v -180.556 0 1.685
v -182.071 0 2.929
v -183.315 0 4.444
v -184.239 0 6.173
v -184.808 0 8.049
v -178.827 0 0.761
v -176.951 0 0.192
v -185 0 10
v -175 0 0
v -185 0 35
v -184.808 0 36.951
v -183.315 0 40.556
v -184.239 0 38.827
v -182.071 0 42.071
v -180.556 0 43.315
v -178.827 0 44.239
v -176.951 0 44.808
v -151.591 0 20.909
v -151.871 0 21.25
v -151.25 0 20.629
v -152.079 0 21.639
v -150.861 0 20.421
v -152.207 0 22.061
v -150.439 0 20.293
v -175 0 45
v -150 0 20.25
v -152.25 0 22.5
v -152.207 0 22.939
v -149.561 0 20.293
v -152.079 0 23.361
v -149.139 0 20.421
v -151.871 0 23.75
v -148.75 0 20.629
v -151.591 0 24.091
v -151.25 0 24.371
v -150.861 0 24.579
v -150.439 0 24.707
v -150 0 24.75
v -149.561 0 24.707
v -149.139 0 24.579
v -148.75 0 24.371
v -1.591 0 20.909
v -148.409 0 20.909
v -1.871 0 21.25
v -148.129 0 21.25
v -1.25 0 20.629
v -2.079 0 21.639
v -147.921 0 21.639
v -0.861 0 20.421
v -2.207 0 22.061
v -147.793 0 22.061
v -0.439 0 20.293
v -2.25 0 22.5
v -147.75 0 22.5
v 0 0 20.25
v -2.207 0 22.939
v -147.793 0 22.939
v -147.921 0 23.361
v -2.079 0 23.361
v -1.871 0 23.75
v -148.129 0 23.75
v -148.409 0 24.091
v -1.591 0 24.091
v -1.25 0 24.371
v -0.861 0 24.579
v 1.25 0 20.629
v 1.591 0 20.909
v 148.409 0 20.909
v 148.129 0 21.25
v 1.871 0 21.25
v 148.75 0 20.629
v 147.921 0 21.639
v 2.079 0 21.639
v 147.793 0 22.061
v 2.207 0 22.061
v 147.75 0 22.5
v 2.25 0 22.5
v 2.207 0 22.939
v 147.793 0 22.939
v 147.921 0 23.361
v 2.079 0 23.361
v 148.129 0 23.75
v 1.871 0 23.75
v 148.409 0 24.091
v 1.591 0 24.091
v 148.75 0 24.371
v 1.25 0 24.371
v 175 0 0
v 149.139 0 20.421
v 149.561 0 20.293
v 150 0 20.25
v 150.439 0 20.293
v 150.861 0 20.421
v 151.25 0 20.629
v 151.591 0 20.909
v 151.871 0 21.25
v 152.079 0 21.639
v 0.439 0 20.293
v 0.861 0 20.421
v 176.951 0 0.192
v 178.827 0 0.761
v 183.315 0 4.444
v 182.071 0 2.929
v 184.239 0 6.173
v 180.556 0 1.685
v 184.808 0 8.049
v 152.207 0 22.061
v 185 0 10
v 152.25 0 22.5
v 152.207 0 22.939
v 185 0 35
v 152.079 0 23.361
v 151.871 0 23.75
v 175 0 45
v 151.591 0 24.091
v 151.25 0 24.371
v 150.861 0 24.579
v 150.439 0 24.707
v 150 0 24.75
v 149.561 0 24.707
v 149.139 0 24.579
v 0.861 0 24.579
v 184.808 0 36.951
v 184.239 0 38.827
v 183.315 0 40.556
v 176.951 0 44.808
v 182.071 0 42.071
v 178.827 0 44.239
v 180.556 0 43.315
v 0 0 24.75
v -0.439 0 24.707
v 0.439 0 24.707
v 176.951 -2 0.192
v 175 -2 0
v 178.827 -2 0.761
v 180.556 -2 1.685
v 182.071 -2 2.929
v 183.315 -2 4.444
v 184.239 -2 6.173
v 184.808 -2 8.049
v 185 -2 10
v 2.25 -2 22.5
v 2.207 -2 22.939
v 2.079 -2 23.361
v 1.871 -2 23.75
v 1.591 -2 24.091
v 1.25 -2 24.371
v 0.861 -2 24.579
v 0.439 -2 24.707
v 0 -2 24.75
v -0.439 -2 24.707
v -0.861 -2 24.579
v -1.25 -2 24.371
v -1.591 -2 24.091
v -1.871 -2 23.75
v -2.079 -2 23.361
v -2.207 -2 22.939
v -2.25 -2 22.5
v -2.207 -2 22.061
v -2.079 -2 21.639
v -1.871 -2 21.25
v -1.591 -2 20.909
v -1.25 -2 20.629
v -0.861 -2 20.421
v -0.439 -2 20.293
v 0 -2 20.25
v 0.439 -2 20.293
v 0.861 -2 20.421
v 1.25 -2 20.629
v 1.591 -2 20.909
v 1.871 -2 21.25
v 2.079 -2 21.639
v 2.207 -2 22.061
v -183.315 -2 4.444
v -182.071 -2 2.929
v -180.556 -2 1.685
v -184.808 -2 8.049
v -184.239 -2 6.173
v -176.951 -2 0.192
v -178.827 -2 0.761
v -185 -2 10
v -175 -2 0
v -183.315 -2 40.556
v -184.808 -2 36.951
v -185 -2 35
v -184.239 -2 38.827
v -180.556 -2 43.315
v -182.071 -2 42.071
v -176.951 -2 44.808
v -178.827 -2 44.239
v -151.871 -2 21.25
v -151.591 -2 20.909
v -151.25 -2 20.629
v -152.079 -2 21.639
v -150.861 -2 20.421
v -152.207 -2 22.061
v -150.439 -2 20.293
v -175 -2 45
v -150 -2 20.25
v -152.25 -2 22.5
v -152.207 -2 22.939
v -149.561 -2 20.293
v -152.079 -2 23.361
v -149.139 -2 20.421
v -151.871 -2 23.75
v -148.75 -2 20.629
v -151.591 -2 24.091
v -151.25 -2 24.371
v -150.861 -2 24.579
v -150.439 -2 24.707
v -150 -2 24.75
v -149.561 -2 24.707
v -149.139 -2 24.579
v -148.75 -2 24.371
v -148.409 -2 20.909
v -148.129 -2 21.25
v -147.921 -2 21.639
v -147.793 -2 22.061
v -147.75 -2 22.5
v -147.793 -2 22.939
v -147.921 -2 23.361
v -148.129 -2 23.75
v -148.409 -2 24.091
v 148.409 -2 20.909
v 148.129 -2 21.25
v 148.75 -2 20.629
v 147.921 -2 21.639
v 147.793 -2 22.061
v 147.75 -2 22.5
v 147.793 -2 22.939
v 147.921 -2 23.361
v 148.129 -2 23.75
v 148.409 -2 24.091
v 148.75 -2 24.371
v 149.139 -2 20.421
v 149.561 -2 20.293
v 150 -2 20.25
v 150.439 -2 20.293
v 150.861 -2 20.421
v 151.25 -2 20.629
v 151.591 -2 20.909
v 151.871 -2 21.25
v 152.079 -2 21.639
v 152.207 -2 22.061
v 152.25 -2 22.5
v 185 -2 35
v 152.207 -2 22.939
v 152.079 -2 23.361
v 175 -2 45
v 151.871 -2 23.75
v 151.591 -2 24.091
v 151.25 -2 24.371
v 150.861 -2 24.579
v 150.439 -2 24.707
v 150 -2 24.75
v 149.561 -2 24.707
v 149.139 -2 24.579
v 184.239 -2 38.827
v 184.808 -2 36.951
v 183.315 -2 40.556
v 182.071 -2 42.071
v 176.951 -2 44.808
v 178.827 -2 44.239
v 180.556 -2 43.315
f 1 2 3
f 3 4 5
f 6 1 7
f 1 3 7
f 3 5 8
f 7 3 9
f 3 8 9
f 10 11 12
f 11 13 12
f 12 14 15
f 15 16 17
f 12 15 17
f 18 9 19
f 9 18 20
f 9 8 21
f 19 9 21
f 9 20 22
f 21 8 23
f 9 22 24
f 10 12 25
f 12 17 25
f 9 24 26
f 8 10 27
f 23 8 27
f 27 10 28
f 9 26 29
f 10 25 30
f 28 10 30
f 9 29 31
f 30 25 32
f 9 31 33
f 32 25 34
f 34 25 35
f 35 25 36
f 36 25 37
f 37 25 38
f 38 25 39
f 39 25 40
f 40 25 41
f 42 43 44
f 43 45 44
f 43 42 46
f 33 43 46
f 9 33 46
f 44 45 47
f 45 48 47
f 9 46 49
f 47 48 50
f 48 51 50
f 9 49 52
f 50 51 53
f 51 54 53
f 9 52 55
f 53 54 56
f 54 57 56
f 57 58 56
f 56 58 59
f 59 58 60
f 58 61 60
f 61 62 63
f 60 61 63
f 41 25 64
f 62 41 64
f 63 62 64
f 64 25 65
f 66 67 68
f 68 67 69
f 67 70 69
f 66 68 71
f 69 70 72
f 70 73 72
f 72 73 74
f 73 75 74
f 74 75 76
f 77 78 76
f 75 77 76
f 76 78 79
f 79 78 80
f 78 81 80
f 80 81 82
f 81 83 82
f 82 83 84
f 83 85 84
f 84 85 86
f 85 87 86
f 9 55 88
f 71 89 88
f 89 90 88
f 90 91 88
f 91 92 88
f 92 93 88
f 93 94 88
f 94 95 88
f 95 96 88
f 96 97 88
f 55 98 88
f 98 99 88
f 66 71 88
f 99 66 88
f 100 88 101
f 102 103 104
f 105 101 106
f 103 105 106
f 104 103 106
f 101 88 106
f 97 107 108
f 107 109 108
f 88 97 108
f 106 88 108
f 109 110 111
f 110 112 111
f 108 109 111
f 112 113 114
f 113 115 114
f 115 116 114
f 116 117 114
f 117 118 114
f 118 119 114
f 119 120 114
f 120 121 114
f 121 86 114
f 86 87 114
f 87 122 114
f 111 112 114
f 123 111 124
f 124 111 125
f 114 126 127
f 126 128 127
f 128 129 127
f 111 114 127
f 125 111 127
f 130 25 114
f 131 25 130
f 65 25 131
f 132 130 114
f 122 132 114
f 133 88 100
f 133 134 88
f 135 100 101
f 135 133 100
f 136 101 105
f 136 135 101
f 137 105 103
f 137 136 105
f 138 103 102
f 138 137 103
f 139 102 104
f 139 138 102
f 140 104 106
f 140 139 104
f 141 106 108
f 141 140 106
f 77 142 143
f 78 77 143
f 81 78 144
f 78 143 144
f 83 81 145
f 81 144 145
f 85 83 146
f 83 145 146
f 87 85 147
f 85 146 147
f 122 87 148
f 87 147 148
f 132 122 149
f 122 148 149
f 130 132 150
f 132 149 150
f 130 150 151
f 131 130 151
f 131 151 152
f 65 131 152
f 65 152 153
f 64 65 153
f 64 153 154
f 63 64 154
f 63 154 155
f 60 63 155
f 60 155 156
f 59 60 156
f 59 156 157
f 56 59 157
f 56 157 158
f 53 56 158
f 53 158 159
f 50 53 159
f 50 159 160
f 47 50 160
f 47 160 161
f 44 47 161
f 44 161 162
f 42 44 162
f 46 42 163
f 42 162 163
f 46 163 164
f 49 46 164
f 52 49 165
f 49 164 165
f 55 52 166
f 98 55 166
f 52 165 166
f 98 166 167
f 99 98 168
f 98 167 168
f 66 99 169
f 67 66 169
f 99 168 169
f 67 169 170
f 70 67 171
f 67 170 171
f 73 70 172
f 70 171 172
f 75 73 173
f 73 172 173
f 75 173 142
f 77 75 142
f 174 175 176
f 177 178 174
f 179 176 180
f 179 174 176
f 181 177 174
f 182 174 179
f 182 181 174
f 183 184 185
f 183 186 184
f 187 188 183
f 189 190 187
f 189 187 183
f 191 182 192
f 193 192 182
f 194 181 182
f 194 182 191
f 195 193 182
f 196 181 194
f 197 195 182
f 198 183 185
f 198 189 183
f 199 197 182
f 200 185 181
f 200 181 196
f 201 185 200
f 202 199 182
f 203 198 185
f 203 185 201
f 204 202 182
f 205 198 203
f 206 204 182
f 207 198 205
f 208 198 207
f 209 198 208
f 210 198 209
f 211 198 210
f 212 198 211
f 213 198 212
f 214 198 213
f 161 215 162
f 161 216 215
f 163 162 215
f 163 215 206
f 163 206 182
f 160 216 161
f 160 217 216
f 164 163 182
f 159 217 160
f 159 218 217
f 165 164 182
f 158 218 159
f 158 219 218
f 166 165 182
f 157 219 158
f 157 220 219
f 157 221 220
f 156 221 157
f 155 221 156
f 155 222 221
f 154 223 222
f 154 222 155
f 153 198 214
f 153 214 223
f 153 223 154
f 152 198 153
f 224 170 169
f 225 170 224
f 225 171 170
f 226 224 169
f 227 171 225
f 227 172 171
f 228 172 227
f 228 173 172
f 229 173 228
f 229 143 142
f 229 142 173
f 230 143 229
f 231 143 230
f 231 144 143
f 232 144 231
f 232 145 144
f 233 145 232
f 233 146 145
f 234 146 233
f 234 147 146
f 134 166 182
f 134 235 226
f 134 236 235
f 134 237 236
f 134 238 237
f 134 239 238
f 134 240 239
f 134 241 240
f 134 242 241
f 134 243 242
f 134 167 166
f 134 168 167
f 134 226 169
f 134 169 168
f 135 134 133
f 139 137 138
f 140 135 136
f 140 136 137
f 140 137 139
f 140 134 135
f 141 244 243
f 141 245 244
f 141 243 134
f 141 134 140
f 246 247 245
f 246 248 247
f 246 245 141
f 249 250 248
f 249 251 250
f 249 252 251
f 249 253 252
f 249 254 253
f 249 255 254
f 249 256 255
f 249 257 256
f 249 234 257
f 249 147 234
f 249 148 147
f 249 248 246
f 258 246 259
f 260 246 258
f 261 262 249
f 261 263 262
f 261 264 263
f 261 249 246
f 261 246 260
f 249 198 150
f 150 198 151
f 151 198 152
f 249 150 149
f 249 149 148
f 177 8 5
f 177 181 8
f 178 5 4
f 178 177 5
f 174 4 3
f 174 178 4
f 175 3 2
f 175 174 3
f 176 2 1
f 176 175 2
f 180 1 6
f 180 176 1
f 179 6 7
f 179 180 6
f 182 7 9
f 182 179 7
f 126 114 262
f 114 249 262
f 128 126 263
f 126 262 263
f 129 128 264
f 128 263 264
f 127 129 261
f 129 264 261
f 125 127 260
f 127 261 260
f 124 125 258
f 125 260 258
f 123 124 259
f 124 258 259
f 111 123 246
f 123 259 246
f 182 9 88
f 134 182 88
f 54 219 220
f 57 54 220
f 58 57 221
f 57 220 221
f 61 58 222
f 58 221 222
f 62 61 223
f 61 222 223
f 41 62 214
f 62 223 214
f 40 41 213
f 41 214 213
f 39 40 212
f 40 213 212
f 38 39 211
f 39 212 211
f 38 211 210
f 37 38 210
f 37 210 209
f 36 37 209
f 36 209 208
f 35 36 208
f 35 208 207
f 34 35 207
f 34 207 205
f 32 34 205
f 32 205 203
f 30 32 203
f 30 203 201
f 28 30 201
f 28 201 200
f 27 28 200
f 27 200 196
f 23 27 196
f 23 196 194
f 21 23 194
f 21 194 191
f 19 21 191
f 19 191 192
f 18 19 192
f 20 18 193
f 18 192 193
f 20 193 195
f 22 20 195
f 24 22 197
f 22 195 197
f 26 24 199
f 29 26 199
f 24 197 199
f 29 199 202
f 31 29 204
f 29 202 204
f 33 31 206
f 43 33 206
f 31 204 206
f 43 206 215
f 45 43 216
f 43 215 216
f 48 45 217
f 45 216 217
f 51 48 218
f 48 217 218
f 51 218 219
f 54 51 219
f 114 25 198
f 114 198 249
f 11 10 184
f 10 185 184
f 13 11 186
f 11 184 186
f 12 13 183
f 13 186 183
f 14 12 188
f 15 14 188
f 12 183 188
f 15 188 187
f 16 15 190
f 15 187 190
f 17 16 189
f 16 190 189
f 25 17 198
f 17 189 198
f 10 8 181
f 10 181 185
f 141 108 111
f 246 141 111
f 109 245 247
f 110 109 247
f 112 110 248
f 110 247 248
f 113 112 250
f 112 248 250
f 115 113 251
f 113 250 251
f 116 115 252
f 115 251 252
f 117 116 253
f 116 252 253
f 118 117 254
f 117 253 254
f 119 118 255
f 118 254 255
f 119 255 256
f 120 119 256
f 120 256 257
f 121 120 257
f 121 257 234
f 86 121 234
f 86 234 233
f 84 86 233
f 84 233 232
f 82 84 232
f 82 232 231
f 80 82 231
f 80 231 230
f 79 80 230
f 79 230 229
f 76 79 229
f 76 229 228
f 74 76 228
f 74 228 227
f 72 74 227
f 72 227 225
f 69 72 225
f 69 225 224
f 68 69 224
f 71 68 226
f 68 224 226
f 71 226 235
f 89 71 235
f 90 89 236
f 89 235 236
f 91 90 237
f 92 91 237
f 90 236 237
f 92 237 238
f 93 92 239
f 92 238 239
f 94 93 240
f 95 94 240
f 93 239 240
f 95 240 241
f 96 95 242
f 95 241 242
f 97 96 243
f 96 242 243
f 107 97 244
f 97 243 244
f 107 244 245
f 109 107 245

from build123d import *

# Parameters (mm, degrees)
F0_W     = 370
F0_H     = 45
F1_DEPTH = 2
F2_R     = 2.25
F3_DEPTH = 25
F4_R     = 10


with BuildPart() as f1:
    # F0 (on Front) → F1 (new body)
    with BuildSketch(Plane.XZ):
        with Locations((0, 22.5)):
            Rectangle(F0_W, F0_H)
    extrude(amount=F1_DEPTH)

    # F2 (on face) → F3 (cut)
    with BuildSketch(Plane.XZ.offset(2)):
        with Locations((0, 22.5)):
            Circle(F2_R)
        with Locations((-150, 22.5)):
            Circle(F2_R)
        with Locations((150, 22.5)):
            Circle(F2_R)
    extrude(amount=-F3_DEPTH, mode=Mode.SUBTRACT)

    # F4
    f4_edges = [f1.edges().sort_by_distance(p)[0] for p in [
        (185, -1, 45),
        (185, -1, 0),
        (-185, -1, 45),
        (-185, -1, 0),
    ]]
    fillet(f4_edges, radius=F4_R)


solid = f1.part
